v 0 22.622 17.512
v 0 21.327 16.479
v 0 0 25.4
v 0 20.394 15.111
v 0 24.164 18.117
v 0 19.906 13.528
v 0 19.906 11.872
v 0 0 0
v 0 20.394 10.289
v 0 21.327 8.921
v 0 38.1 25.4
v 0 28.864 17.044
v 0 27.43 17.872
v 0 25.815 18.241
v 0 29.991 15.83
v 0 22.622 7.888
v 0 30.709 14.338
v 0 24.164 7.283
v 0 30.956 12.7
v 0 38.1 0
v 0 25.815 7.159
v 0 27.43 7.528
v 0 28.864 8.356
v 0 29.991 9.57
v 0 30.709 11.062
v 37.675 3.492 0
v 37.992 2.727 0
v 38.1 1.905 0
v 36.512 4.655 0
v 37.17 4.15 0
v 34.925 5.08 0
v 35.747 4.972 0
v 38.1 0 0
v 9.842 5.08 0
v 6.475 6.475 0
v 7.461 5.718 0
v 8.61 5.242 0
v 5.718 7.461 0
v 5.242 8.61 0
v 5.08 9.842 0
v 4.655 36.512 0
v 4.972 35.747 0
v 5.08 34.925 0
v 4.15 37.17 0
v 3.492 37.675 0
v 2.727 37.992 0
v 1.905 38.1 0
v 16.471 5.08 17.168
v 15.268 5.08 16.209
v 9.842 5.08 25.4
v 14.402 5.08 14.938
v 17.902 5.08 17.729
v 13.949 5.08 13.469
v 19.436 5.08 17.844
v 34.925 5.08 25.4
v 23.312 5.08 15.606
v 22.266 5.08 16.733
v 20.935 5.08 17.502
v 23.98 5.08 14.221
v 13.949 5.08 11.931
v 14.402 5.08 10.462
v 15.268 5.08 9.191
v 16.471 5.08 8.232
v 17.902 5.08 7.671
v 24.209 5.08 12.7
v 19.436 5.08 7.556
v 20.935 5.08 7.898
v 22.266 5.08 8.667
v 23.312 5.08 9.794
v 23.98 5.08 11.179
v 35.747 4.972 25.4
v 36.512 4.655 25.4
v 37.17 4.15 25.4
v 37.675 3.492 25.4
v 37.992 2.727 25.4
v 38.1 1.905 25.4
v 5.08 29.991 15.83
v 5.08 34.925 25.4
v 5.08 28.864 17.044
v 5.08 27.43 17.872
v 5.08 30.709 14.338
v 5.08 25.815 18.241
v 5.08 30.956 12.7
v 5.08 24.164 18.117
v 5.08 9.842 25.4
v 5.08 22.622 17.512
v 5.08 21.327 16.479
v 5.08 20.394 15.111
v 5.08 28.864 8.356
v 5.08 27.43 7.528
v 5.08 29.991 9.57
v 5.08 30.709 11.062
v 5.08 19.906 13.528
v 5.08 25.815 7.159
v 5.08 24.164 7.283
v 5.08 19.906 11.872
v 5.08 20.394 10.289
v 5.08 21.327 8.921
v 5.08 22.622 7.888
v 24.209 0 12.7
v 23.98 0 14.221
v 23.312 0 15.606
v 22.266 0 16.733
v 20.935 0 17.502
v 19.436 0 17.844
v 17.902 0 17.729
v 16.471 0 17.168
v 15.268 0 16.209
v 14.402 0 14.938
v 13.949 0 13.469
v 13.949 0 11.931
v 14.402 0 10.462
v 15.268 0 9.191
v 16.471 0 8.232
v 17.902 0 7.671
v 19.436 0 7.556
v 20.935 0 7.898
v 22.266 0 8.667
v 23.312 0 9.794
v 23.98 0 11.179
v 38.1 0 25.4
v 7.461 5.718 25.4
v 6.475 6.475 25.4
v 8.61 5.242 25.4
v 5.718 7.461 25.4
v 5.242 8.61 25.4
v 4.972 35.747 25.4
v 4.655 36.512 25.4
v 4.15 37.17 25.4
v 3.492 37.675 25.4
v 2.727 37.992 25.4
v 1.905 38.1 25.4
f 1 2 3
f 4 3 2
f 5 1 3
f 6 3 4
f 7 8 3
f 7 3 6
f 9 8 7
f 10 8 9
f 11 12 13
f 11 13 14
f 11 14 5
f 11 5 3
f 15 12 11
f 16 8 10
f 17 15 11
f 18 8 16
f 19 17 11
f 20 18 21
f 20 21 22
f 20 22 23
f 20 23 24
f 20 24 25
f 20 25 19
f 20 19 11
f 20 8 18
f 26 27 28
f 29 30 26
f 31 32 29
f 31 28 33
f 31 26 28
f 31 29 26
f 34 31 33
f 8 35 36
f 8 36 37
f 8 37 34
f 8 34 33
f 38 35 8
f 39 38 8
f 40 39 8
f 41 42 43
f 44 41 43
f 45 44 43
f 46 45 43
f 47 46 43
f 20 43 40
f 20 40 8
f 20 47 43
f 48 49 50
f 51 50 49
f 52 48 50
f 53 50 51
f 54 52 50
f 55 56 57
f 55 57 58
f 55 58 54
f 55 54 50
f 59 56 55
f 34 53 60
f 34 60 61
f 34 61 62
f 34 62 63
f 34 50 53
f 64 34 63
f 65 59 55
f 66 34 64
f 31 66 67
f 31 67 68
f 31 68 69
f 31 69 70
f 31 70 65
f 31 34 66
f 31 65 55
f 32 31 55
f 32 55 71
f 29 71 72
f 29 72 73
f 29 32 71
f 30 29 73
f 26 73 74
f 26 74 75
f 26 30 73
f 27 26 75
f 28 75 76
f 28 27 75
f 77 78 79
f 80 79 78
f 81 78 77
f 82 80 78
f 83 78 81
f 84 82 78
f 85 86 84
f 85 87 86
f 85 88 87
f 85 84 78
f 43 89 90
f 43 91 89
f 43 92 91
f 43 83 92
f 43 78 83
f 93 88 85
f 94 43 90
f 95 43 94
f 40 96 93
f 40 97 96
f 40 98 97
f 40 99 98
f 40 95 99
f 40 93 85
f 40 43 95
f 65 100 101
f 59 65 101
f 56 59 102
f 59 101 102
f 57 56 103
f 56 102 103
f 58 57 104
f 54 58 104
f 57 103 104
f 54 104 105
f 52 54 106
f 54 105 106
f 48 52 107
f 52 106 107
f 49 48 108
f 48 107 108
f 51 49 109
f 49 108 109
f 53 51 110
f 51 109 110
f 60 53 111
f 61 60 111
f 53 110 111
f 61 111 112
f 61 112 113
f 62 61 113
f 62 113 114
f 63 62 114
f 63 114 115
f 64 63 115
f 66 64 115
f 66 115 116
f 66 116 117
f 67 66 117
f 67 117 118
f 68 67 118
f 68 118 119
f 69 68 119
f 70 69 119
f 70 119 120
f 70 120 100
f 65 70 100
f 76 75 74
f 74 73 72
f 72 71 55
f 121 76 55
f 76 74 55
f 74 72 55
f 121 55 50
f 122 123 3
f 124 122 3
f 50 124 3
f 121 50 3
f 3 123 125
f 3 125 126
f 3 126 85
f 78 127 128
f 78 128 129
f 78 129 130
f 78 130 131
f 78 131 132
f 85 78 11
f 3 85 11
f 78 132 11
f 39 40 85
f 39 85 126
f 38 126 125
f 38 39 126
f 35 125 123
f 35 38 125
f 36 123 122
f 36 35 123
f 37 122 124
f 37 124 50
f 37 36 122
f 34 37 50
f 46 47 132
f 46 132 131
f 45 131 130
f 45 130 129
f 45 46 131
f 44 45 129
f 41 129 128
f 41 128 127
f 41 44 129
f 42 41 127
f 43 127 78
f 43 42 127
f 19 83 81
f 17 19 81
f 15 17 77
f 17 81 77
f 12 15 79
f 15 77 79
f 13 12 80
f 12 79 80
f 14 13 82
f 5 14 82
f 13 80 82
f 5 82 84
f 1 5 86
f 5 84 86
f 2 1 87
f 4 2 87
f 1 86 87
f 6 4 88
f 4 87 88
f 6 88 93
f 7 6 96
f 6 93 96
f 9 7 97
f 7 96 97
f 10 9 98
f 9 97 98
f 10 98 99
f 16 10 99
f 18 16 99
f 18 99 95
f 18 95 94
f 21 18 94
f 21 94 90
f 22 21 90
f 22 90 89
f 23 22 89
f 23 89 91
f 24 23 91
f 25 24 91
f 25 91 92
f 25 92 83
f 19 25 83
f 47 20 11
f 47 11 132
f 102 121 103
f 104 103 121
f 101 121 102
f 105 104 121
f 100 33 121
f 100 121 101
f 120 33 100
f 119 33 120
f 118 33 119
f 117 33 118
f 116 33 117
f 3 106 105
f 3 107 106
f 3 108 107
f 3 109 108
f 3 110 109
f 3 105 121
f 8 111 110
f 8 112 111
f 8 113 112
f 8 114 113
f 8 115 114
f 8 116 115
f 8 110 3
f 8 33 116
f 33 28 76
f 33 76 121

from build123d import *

# Parameters (mm, degrees)
EXTRUDE1_DEPTH          = 25.4
F_3_8_CLEARANCE_HOLE1_D = 10.31748
CUT_EXTRUDE1_REACH      = 58.454
SKETCH5_R               = 5.55625


with BuildPart() as part:
    # Sketch1 → Extrude1 (new body)
    with BuildSketch(Plane.XY):
        with BuildLine():
            Line((0, 0), (0, 38.1))
            Line((0, 38.1), (1.905, 38.1))
            ThreePointArc((1.905, 38.1), (4.15006403, 37.17006403), (5.08, 34.925))
            Line((5.08, 34.925), (5.08, 9.8425))
            ThreePointArc((5.08, 9.8425), (6.474903955, 6.474903955), (9.8425, 5.08))
            Line((9.8425, 5.08), (34.925, 5.08))
            ThreePointArc((34.925, 5.08), (37.17006403, 4.15006403), (38.1, 1.905))
            Line((38.1, 1.905), (38.1, 0))
            Line((38.1, 0), (0, 0))
        make_face()
    extrude(amount=EXTRUDE1_DEPTH)

    # 3/8 Clearance Hole1 (through all)
    with Locations(Plane(origin=(0, 5.08, 0), x_dir=(-1, 0, 0), z_dir=(0, 1, 0))):
        with Locations((-19.05, 12.7)):
            Hole(F_3_8_CLEARANCE_HOLE1_D / 2)

    # Sketch5 → Cut-Extrude1 (cut, up to next)
    with BuildSketch(Plane(origin=(5.08, 0, 0), x_dir=(0, 0, -1), z_dir=(1, 0, 0)), mode=Mode.PRIVATE) as cut_extrude1_sk1:
        with Locations(Location((-12.7, 25.4, 0), (0, 0, 90))):
            Circle(SKETCH5_R)
    cut_extrude1_tool1 = extrude(cut_extrude1_sk1.sketch, amount=-CUT_EXTRUDE1_REACH, mode=Mode.PRIVATE) & part.part
    add(cut_extrude1_tool1.solids().sort_by_distance((5.08, 25.4, 12.7))[0], mode=Mode.SUBTRACT)


solid = part.part
